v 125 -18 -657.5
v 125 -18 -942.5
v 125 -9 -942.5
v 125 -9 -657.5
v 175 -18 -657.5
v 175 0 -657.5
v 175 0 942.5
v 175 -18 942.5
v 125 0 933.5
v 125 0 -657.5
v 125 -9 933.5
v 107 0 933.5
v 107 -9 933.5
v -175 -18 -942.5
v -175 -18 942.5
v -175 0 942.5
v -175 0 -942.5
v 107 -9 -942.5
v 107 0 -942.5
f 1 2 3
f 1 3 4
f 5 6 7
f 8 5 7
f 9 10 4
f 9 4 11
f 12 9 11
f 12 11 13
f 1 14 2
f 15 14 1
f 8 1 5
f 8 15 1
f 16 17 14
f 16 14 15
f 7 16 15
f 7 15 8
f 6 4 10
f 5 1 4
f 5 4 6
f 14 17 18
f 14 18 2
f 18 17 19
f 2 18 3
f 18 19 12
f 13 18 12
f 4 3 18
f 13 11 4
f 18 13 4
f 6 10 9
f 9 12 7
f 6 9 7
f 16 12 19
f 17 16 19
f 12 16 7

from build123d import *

# Parameters (mm, degrees)
F0_W     = 350
F0_H     = 1885
F1_DEPTH = 18
F2_W     = 50
F2_H     = 285
F3_DEPTH = 18
F4_W     = 18
F4_H     = 1876
F5_DEPTH = 9


with BuildPart() as f1:
    # F0 (on Front) → F1 (new body)
    with BuildSketch(Plane.XZ):
        Rectangle(F0_W, F0_H)
    extrude(amount=F1_DEPTH)

    # F2 (on face) → F3 (cut)
    with BuildSketch(Plane.XZ.offset(18)):
        with Locations((150, -800)):
            Rectangle(F2_W, F2_H)
    extrude(amount=-F3_DEPTH, mode=Mode.SUBTRACT)

    # F4 (on face) → F5 (cut)
    with BuildSketch(Plane(origin=(0, 0, 0), x_dir=(-1, 0, 0), z_dir=(0, 1, 0))):
        with Locations((-116, -4.5)):
            Rectangle(F4_W, F4_H)
    extrude(amount=-F5_DEPTH, mode=Mode.SUBTRACT)


solid = f1.part
